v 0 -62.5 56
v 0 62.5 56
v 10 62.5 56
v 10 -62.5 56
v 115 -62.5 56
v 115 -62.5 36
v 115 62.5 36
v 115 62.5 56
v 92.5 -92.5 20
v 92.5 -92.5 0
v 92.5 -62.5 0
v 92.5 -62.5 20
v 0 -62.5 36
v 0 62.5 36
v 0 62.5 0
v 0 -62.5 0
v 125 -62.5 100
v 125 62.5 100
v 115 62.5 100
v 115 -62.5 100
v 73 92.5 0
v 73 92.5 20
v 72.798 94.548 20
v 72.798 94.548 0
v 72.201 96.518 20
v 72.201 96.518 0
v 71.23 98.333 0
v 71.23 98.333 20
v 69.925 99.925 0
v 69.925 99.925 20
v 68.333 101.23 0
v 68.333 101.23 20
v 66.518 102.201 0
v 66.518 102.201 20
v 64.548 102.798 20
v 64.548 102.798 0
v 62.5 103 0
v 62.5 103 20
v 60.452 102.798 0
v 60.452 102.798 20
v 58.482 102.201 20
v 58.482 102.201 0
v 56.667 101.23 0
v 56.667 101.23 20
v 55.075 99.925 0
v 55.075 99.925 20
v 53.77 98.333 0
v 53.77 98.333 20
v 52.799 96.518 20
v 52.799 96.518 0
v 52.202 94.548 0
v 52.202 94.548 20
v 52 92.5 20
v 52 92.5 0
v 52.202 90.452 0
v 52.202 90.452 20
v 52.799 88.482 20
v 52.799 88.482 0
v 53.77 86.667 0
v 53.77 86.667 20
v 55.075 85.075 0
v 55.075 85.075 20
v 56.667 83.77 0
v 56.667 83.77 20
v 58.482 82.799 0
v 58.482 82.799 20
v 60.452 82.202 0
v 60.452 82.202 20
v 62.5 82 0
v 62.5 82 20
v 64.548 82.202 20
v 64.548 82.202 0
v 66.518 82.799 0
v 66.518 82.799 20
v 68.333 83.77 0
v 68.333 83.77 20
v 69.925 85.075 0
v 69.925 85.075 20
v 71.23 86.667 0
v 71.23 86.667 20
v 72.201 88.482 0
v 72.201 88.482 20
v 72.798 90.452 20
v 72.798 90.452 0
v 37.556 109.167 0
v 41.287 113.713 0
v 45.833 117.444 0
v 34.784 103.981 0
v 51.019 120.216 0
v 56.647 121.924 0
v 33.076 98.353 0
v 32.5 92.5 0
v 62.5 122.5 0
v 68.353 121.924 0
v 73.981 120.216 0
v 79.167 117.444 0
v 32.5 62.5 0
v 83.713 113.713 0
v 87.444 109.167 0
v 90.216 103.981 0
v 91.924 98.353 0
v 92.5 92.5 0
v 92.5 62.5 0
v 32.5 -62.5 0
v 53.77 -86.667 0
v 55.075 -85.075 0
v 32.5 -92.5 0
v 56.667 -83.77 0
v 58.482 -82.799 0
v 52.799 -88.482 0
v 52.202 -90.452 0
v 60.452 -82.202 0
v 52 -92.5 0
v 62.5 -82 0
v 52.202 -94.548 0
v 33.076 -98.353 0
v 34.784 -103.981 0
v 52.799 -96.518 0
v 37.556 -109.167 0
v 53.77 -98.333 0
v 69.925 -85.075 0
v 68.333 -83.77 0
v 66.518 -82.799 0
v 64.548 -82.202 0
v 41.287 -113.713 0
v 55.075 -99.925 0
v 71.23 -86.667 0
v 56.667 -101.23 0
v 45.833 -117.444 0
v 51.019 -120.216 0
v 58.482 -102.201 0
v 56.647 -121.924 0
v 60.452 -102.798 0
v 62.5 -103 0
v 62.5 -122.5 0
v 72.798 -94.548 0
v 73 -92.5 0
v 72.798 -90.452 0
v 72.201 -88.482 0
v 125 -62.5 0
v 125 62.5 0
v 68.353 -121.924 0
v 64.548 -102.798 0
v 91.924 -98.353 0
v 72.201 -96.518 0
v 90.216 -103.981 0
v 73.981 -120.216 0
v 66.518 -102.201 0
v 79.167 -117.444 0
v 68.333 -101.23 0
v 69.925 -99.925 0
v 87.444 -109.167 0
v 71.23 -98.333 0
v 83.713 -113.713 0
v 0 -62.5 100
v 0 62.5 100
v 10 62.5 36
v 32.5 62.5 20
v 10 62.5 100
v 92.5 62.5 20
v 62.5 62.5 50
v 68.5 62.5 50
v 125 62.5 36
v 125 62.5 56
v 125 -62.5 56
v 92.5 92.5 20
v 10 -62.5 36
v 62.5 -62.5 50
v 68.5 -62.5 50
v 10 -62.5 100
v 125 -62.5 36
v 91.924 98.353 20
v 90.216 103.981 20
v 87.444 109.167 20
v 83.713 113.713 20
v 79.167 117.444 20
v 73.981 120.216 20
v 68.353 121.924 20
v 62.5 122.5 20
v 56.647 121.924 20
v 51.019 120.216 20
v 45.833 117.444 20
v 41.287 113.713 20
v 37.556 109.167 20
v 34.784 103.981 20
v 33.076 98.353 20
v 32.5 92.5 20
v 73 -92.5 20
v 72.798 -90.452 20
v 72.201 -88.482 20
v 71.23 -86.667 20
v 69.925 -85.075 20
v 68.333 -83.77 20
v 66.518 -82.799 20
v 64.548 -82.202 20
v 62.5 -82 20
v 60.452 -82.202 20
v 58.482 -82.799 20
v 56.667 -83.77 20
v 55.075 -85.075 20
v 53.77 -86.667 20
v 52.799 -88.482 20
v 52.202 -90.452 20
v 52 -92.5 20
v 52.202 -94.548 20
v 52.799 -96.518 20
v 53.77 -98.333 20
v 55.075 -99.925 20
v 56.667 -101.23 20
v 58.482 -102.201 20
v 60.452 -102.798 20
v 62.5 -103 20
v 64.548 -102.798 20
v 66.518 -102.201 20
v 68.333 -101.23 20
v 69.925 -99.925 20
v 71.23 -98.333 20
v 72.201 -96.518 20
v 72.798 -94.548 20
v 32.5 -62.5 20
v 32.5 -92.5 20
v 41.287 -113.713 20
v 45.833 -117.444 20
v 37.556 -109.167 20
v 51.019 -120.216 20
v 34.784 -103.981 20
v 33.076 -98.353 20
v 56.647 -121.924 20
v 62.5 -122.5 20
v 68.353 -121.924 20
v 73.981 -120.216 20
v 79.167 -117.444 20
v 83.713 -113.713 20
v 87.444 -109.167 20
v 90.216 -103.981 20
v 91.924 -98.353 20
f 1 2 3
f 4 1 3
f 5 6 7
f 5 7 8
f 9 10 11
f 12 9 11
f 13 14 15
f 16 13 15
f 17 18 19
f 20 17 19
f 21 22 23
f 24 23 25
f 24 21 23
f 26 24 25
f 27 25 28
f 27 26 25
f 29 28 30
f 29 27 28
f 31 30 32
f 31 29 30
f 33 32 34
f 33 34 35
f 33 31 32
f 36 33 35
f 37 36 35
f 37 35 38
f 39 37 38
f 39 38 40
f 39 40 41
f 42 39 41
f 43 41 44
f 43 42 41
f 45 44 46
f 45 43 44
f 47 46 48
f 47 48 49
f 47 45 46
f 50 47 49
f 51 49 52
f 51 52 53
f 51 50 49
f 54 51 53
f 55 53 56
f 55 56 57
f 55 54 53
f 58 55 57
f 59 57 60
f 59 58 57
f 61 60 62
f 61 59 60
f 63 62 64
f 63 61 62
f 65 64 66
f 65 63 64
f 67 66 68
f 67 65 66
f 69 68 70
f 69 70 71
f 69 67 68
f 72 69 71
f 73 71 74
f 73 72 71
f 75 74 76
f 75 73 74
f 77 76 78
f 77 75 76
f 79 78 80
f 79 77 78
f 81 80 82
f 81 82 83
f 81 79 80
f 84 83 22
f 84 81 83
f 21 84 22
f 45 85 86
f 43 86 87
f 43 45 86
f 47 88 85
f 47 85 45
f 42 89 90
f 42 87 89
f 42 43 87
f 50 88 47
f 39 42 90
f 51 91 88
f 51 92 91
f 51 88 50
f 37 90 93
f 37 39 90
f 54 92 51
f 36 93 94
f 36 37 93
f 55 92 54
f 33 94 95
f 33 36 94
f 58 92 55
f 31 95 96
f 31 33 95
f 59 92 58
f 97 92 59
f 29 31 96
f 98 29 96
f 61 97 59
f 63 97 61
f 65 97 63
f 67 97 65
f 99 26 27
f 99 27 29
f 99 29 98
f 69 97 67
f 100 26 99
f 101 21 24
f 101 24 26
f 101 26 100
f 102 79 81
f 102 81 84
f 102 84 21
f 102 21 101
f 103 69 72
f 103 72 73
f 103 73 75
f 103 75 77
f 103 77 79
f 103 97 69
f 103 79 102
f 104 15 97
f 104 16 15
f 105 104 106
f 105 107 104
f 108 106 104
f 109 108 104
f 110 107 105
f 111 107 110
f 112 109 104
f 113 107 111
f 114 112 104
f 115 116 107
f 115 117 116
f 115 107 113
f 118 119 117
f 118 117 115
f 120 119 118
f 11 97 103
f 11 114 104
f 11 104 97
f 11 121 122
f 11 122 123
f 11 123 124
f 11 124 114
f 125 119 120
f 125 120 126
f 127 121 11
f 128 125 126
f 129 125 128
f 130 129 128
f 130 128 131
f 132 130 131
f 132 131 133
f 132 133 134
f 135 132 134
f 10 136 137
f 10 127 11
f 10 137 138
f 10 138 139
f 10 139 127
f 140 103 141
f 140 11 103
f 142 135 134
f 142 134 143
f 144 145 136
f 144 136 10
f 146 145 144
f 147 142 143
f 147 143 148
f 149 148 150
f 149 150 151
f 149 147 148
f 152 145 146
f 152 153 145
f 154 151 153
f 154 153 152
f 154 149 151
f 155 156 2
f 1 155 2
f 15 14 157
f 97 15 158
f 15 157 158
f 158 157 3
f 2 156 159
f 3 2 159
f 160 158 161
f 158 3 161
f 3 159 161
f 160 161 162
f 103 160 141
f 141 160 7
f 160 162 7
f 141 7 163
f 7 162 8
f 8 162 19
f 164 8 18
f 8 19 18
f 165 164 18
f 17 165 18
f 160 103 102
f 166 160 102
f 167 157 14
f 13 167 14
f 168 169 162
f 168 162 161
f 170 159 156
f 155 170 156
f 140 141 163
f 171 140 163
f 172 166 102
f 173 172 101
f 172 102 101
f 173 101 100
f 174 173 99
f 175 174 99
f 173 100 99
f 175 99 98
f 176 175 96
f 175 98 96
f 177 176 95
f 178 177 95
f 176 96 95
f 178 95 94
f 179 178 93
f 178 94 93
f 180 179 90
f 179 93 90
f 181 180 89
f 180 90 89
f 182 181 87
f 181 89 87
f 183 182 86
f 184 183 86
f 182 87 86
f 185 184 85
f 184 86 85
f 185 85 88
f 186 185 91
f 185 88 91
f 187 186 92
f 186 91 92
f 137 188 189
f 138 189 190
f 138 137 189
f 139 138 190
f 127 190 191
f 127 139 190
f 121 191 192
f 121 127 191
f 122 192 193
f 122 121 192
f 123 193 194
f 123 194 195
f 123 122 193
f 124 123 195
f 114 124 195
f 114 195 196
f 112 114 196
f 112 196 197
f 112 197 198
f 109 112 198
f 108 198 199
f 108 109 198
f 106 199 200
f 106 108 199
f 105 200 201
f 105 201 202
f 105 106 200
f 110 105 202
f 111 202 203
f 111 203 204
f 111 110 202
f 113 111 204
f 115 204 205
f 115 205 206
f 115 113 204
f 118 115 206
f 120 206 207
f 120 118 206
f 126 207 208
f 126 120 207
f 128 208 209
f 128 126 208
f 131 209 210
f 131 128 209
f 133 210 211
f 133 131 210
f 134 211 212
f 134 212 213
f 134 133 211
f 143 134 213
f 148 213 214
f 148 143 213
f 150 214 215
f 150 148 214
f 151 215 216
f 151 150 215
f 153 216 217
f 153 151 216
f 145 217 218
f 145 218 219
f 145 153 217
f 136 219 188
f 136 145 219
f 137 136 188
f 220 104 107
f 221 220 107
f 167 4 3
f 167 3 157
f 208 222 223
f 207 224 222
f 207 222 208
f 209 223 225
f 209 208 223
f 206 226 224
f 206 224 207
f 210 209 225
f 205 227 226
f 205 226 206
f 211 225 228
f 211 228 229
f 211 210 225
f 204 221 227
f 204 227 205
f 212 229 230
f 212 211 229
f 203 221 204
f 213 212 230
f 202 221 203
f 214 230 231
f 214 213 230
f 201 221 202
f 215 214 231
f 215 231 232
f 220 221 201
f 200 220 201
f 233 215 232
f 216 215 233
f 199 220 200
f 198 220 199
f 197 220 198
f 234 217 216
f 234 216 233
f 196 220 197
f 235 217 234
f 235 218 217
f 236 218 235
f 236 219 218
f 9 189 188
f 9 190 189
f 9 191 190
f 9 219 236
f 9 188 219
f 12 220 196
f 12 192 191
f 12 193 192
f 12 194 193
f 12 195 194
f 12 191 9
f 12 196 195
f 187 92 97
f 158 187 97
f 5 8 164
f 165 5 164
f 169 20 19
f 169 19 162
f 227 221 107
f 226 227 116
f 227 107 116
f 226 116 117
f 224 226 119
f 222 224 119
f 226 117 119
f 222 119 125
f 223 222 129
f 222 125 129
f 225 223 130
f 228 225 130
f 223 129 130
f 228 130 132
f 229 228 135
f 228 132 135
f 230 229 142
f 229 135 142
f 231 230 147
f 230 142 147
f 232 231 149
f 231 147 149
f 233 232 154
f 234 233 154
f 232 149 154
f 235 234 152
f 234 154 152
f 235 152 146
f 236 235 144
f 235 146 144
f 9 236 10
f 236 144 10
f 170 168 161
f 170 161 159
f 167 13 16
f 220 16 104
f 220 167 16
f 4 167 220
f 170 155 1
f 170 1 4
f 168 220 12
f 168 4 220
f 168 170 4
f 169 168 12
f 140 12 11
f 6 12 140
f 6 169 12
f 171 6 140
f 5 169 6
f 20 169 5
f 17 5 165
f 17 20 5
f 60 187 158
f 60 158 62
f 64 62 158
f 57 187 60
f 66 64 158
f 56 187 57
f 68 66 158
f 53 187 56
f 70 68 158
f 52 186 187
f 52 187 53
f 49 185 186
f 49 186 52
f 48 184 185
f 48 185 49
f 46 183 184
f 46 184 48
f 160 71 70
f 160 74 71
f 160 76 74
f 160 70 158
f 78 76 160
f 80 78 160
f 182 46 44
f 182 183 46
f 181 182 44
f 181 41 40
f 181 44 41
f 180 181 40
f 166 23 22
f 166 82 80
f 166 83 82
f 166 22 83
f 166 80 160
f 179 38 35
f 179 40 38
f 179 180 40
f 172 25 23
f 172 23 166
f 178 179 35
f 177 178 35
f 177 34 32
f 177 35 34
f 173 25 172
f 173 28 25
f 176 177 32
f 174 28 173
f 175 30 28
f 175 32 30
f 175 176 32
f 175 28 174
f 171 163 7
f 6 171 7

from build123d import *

# Parameters (mm, degrees)
F1_DEPTH = 62.5
F2_R     = 10.5
F3_DEPTH = 20


with BuildPart() as f1:
    # F0 (on Front) → F1 (new body, symmetric)
    with BuildSketch(Plane.XZ):
        Polygon((0, 0), (125, 0), (125, 36), (115, 36), (115, 56), (125, 56), (125, 100), (115, 100), (68.5, 50), (62.5, 50), (10, 100), (0, 100), (0, 56), (10, 56), (10, 36), (0, 36), align=None)
    extrude(amount=F1_DEPTH, both=True)

    # F2 (on Top) → F3 (join)
    with BuildSketch(Plane.XY):
        with BuildLine():
            Line((62.5, -62.5), (32.5, -62.5))
            Line((32.5, -62.5), (32.5, -92.5))
            ThreePointArc((32.5, -92.5), (62.5, -122.5), (92.5, -92.5))
            Line((92.5, -92.5), (92.5, -62.5))
            Line((92.5, -62.5), (62.5, -62.5))
        make_face()
        with Locations((62.5, -92.5)):
            Circle(F2_R, mode=Mode.SUBTRACT)
        with BuildLine():
            Line((32.5, 92.5), (32.5, 62.5))
            Line((32.5, 62.5), (62.5, 62.5))
            Line((62.5, 62.5), (92.5, 62.5))
            Line((92.5, 62.5), (92.5, 92.5))
            ThreePointArc((92.5, 92.5), (62.5, 122.5), (32.5, 92.5))
        make_face()
        with Locations((62.5, 92.5)):
            Circle(F2_R, mode=Mode.SUBTRACT)
    extrude(amount=F3_DEPTH)


solid = f1.part
